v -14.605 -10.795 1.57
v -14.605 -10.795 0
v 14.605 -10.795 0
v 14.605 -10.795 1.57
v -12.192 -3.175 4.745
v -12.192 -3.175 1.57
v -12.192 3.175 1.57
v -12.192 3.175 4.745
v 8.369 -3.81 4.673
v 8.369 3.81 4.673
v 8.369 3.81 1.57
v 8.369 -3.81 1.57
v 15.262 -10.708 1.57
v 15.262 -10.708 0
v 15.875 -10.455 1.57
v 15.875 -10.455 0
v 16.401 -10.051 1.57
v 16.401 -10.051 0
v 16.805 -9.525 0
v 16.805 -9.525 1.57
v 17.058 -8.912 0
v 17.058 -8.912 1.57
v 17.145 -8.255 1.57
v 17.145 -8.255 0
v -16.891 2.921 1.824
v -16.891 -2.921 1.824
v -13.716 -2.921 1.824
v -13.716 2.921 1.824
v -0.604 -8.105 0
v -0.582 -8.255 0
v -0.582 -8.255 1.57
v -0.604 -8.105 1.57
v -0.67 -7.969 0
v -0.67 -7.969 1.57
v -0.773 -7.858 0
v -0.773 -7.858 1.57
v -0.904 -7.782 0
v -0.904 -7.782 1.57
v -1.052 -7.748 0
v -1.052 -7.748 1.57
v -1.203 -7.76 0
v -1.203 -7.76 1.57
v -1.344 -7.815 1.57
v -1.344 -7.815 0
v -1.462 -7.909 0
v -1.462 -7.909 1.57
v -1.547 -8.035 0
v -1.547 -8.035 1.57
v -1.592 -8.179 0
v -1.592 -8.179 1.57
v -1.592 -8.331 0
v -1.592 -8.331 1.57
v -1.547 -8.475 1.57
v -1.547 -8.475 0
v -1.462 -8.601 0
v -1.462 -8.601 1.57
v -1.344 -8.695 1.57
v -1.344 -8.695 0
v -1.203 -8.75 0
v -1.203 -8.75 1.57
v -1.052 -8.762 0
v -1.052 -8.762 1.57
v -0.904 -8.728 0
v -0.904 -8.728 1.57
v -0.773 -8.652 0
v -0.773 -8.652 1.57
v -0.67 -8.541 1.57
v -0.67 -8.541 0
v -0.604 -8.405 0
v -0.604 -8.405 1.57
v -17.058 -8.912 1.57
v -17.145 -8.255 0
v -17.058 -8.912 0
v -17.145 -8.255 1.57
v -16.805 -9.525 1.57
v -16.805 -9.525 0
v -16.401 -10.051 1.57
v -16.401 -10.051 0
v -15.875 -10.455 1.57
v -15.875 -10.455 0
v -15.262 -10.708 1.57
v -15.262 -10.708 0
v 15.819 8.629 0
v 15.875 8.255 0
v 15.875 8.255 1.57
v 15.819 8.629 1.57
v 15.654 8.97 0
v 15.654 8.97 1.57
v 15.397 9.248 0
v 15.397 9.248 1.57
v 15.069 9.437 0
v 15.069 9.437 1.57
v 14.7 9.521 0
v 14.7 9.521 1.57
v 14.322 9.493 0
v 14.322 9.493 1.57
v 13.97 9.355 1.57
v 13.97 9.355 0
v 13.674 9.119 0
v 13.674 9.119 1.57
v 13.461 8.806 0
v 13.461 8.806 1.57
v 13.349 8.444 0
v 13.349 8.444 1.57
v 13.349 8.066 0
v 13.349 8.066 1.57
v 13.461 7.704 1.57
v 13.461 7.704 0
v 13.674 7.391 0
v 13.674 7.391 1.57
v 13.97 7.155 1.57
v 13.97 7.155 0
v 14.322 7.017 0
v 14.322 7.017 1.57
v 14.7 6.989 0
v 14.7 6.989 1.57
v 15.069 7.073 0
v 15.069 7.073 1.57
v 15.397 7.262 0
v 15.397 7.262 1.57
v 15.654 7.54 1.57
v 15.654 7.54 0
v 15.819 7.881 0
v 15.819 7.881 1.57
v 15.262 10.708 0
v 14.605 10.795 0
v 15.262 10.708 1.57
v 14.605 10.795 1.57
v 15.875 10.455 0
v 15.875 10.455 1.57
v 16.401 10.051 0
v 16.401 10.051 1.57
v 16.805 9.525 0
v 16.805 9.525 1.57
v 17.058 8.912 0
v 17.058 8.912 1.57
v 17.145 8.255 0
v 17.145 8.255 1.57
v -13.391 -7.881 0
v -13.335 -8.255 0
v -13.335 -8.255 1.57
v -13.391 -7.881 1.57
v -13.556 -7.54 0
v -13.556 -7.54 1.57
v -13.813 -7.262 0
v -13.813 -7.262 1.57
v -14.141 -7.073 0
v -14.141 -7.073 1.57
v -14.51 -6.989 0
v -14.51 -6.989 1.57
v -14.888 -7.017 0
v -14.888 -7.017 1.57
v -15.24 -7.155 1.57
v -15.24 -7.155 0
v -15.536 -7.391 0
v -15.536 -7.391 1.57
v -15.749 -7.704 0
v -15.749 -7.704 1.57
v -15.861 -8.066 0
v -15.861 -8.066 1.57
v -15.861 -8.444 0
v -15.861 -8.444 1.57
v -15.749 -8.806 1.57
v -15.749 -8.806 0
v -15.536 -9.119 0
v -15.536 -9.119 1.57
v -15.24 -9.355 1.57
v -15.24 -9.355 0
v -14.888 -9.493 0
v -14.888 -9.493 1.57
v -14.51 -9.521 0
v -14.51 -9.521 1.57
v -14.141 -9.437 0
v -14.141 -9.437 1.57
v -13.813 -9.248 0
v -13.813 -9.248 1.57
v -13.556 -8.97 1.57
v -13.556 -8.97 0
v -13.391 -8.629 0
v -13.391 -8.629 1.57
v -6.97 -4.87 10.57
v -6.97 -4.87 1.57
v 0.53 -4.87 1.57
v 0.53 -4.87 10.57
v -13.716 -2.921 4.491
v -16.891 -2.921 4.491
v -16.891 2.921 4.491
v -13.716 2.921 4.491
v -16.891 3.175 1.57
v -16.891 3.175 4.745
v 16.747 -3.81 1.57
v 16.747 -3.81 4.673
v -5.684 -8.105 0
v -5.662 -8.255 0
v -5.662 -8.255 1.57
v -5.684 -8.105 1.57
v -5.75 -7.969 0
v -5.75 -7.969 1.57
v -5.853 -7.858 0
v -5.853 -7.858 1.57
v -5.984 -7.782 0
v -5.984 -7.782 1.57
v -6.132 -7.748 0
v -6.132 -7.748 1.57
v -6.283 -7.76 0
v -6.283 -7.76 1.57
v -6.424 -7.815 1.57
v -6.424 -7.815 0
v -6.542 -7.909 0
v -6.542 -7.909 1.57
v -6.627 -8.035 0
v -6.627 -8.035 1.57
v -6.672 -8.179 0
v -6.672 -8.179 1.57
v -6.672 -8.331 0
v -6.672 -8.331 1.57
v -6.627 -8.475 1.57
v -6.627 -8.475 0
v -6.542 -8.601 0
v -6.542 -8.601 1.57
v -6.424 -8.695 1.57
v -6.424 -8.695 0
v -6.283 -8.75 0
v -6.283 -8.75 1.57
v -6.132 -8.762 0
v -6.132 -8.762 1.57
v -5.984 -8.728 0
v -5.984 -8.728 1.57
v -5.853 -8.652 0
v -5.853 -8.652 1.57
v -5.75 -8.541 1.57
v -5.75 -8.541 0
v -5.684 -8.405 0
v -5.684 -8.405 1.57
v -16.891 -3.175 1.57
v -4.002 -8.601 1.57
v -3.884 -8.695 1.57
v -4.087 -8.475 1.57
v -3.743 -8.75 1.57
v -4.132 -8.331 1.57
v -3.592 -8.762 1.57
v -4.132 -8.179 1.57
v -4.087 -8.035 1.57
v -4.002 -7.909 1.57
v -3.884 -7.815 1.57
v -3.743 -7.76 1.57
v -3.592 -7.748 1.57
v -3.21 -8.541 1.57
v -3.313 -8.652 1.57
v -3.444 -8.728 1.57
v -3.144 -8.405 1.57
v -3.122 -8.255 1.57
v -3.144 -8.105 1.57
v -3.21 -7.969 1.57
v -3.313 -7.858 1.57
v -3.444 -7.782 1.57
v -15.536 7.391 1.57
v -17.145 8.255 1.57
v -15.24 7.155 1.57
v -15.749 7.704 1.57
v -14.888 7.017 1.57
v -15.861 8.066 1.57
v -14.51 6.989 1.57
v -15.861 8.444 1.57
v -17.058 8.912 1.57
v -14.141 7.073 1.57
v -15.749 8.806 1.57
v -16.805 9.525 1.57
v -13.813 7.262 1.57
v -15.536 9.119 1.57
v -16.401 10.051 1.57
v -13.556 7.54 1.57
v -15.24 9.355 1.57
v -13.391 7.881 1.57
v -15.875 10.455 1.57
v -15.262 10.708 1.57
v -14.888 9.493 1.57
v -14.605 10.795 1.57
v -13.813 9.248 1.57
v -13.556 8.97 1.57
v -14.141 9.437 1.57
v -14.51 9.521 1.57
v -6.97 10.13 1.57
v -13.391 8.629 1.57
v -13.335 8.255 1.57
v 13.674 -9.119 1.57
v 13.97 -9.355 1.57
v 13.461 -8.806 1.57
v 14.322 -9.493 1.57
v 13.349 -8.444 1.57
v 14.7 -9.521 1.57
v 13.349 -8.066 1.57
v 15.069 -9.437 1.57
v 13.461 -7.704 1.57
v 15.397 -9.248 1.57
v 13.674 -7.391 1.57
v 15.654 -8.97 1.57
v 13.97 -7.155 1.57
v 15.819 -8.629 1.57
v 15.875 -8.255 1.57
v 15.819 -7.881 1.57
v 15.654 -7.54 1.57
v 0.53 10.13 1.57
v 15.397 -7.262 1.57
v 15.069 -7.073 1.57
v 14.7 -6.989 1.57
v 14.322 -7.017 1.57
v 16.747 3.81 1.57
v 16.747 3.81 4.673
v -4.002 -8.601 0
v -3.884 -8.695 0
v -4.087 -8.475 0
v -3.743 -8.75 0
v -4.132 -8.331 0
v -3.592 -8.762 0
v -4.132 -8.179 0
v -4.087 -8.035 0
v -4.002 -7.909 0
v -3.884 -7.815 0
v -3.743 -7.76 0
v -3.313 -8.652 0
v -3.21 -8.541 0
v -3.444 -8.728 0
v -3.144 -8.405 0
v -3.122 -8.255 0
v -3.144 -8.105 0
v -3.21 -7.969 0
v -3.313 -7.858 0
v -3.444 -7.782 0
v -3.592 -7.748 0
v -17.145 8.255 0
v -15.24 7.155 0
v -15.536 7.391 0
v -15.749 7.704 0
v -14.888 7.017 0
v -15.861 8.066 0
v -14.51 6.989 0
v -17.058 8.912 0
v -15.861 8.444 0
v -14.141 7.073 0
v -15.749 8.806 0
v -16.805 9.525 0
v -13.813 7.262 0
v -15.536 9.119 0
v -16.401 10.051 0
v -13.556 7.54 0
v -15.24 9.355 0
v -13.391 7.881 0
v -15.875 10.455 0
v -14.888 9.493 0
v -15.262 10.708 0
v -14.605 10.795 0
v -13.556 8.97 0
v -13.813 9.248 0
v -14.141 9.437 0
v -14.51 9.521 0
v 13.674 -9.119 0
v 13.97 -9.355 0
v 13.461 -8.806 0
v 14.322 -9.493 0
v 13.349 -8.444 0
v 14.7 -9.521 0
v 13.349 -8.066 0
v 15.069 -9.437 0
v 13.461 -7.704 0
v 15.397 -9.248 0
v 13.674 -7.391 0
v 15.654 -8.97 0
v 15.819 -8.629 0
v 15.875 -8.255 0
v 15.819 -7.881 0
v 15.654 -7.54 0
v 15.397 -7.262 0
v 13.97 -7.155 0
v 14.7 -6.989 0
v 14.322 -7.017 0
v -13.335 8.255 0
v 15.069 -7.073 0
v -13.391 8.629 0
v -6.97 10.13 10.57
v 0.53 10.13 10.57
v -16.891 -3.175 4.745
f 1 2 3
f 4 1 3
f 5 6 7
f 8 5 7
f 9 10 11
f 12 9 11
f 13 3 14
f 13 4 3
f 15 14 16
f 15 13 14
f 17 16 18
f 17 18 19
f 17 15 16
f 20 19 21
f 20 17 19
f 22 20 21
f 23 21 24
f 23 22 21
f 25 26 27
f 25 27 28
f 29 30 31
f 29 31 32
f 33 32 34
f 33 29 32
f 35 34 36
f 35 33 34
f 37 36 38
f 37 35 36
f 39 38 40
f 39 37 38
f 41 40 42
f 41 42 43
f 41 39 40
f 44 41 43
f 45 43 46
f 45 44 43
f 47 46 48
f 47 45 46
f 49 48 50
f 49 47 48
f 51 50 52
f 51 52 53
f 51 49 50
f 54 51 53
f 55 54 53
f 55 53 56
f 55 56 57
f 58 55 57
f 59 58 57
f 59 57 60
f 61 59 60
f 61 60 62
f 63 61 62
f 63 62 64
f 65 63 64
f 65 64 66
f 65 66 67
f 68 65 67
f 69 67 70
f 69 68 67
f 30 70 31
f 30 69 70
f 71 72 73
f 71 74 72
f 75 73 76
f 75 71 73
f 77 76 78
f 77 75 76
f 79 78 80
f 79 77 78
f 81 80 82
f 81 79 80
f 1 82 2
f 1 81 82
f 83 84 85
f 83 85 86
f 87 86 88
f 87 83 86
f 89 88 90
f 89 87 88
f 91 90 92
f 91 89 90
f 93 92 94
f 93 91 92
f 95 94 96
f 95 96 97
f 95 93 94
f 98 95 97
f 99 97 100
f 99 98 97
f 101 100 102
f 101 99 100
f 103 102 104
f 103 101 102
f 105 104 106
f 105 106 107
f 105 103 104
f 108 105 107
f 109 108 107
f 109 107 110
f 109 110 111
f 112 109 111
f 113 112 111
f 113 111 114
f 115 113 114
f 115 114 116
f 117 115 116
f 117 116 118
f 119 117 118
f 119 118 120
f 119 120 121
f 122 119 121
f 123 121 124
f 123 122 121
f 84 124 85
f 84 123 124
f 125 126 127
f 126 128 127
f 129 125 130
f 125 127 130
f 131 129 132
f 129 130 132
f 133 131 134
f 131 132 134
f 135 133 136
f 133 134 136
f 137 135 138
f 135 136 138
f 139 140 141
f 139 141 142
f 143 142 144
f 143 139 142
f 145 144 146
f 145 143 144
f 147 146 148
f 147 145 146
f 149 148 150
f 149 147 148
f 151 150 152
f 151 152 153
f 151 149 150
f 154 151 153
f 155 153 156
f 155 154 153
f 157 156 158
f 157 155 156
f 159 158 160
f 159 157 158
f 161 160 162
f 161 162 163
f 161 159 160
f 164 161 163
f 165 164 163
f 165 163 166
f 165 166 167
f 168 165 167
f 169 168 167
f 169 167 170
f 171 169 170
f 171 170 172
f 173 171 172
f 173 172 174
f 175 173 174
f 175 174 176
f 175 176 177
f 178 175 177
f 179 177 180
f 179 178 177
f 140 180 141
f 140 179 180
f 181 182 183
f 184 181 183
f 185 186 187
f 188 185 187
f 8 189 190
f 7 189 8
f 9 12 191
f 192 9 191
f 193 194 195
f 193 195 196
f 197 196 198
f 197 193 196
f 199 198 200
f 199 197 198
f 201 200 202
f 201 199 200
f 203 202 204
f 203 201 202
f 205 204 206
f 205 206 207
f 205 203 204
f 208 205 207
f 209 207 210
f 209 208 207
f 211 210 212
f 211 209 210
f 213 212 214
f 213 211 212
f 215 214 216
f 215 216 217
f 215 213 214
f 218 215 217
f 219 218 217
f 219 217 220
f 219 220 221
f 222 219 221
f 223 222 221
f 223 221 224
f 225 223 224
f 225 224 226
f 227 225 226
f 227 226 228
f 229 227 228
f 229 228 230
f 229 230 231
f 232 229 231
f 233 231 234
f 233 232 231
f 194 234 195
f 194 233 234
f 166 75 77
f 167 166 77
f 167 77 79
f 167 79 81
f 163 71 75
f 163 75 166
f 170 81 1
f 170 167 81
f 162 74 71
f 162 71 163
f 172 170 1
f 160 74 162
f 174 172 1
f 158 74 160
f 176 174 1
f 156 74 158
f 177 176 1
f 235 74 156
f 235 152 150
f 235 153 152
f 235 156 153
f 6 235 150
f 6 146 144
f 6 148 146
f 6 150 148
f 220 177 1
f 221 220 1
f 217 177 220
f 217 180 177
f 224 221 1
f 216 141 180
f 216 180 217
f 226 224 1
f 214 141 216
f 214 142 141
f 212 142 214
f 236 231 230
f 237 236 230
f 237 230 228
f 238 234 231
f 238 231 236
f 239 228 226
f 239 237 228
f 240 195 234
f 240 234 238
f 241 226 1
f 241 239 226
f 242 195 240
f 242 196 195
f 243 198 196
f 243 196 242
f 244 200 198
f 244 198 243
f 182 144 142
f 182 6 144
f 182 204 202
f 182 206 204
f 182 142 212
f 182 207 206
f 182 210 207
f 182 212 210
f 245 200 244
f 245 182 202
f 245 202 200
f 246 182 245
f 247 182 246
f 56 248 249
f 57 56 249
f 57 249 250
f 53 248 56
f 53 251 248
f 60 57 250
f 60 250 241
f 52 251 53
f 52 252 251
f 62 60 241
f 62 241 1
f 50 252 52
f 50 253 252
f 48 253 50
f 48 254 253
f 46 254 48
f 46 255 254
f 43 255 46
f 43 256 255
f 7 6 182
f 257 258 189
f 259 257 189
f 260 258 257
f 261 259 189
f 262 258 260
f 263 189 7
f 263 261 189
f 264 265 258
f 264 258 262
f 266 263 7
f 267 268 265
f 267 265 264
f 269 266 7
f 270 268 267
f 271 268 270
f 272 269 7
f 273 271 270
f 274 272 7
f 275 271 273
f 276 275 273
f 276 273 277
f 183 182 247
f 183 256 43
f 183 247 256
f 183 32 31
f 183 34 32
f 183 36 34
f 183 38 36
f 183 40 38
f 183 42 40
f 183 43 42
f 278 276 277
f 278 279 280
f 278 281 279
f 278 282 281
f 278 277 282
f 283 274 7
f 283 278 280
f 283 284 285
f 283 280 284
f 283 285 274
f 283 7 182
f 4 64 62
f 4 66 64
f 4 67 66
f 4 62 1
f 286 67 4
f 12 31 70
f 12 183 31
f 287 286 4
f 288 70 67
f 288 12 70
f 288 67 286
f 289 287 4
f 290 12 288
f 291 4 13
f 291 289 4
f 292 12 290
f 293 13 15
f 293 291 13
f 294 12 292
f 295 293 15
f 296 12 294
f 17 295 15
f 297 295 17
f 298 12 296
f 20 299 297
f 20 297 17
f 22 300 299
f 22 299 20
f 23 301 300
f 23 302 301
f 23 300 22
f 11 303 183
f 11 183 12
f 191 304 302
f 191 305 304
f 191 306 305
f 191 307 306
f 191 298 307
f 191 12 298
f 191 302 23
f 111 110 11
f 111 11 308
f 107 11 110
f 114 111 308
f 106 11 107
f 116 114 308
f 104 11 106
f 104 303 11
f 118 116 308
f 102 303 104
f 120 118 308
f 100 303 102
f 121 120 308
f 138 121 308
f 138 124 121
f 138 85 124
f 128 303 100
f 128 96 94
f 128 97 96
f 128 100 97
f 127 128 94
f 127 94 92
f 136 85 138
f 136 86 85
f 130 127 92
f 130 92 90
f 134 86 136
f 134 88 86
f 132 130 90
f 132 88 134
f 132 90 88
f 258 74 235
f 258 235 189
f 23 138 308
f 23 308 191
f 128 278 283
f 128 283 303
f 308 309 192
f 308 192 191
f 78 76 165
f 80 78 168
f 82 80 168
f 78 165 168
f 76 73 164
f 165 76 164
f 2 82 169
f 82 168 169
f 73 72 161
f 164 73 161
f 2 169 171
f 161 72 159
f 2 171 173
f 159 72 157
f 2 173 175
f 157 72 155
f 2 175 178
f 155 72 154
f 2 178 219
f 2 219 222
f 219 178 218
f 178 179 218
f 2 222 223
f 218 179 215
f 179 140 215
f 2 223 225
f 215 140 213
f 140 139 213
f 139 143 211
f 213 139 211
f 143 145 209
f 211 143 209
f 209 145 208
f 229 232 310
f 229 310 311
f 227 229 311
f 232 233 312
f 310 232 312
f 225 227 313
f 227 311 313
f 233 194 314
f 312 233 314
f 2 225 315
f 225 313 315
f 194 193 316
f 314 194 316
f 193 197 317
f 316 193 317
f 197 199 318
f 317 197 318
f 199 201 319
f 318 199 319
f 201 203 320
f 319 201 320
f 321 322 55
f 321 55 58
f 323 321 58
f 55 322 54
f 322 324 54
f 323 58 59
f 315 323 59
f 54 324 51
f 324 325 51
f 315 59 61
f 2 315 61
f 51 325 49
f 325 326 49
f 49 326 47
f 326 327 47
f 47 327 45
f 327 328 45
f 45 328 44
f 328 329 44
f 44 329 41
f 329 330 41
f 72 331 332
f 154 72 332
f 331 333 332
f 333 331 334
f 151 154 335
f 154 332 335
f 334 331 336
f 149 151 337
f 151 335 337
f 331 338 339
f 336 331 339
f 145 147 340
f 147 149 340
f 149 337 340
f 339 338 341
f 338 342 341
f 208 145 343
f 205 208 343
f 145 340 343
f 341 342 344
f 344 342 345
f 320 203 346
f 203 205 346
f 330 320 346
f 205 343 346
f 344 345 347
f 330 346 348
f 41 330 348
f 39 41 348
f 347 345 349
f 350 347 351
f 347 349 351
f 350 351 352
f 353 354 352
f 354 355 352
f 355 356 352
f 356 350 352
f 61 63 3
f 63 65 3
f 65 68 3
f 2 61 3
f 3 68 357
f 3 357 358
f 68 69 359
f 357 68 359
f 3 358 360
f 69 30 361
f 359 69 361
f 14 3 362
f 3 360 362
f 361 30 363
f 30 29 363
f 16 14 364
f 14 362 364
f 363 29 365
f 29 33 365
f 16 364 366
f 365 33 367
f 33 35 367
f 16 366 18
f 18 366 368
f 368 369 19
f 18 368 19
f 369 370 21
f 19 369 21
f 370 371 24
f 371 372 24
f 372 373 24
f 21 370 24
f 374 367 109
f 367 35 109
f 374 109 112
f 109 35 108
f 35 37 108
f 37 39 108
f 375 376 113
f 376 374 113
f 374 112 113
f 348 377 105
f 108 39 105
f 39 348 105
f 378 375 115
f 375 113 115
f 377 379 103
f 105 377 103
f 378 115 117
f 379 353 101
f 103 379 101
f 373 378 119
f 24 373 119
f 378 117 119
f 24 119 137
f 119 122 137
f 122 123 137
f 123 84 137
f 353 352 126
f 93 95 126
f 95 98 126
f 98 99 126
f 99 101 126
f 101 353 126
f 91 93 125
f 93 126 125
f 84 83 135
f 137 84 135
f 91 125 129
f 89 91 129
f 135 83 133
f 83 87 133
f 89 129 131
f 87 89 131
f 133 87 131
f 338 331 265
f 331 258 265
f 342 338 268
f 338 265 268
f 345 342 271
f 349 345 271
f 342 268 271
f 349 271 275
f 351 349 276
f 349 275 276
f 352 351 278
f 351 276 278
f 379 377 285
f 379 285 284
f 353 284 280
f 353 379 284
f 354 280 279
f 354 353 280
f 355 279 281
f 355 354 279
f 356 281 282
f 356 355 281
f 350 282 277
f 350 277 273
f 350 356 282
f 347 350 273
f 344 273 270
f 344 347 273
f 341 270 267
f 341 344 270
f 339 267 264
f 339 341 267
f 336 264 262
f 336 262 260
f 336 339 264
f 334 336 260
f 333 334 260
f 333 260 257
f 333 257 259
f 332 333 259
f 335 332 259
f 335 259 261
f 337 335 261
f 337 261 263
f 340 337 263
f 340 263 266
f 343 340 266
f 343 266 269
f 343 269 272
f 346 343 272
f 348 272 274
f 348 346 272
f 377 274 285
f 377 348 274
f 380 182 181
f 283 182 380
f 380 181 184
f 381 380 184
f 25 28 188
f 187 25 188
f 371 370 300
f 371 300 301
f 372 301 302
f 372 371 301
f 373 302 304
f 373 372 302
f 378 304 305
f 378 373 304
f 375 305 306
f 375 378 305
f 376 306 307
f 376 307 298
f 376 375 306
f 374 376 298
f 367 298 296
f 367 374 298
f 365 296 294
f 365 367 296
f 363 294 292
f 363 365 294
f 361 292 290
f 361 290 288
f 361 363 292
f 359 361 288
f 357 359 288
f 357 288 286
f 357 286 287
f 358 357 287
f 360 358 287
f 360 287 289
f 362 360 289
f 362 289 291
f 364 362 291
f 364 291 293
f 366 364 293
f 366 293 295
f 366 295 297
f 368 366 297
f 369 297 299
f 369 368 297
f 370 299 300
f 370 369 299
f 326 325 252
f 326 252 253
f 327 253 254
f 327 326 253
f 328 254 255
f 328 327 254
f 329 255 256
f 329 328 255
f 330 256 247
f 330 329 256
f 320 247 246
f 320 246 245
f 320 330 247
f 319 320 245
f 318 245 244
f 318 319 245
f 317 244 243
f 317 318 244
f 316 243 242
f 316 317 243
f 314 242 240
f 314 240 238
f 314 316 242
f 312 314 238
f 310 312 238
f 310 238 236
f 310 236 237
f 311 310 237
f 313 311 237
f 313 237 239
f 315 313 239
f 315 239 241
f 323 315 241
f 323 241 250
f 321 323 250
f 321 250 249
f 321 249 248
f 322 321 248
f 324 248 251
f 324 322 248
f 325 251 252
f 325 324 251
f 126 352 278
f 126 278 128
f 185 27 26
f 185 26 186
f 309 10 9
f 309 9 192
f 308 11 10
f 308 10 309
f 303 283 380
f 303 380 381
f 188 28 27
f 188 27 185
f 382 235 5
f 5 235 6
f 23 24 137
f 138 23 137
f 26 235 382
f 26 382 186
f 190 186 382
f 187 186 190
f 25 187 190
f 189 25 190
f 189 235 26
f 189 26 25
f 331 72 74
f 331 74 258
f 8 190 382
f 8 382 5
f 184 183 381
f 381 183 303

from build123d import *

# Parameters (mm, degrees)
SKETCH1_W           = 34.29
SKETCH1_H           = 21.59
SKETCH1_R           = 1.27
SKETCH1_R_2         = 0.508
BOSS_EXTRUDE1_DEPTH = 1.5699994
FILLET1_R           = 2.54
SKETCH2_W           = 7.5
SKETCH2_H           = 15
BOSS_EXTRUDE2_DEPTH = 9
SKETCH3_W           = 4.699
SKETCH3_H           = 6.35
BOSS_EXTRUDE3_DEPTH = 3.175
SKETCH4_W           = 2.667
SKETCH4_H           = 5.842
CUT_EXTRUDE1_DEPTH  = 3.175
SKETCH6_W           = 8.378747874
SKETCH6_H           = 3.102965804
BOSS_EXTRUDE4_DEPTH = 3.81


with BuildPart() as part:
    # Sketch1 → Boss-Extrude1 (new body)
    with BuildSketch(Plane.XY):
        Rectangle(SKETCH1_W, SKETCH1_H)
        with Locations((-14.605, 8.255)):
            Circle(SKETCH1_R, mode=Mode.SUBTRACT)
        with Locations((-14.605, -8.255)):
            Circle(SKETCH1_R, mode=Mode.SUBTRACT)
        with Locations((14.605, -8.255)):
            Circle(SKETCH1_R, mode=Mode.SUBTRACT)
        with Locations((14.605, 8.255)):
            Circle(SKETCH1_R, mode=Mode.SUBTRACT)
        with Locations((-6.169791694, -8.255)):
            Circle(SKETCH1_R_2, mode=Mode.SUBTRACT)
        with Locations((-3.629791694, -8.255)):
            Circle(SKETCH1_R_2, mode=Mode.SUBTRACT)
        with Locations((-1.089791694, -8.255)):
            Circle(SKETCH1_R_2, mode=Mode.SUBTRACT)
    extrude(amount=BOSS_EXTRUDE1_DEPTH)

    # Fillet1
    fillet1_edges = [part.edges().sort_by_distance(p)[0] for p in [
        (17.145, -10.795, 0.7849997),
        (-17.145, -10.795, 0.7849997),
        (-17.145, 10.795, 0.7849997),
        (17.145, 10.795, 0.7849997),
    ]]
    fillet(fillet1_edges, radius=FILLET1_R)

    # Sketch2 → Boss-Extrude2 (add)
    with BuildSketch(Plane.XY.offset(1.5699994)):
        with Locations((-3.219698951, 2.629795429)):
            Rectangle(SKETCH2_W, SKETCH2_H)
    extrude(amount=BOSS_EXTRUDE2_DEPTH)

    # Sketch3 → Boss-Extrude3 (add)
    with BuildSketch(Plane.XY.offset(1.5699994)):
        with Locations((-14.5415, 0)):
            Rectangle(SKETCH3_W, SKETCH3_H)
    extrude(amount=BOSS_EXTRUDE3_DEPTH)

    # Sketch4 → Cut-Extrude1 (cut)
    with BuildSketch(Plane.ZY.offset(16.891)):
        with Locations((3.1574994, 0)):
            Rectangle(SKETCH4_W, SKETCH4_H)
    extrude(amount=-CUT_EXTRUDE1_DEPTH, mode=Mode.SUBTRACT)

    # Sketch6 → Boss-Extrude4 (add, symmetric)
    with BuildSketch(Plane(origin=(0, 0, 0), x_dir=(1, 0, 0), z_dir=(0, 1, 0))):
        with Locations((12.558008878, -3.121482302)):
            Rectangle(SKETCH6_W, SKETCH6_H)
    extrude(amount=BOSS_EXTRUDE4_DEPTH, both=True)


solid = part.part
